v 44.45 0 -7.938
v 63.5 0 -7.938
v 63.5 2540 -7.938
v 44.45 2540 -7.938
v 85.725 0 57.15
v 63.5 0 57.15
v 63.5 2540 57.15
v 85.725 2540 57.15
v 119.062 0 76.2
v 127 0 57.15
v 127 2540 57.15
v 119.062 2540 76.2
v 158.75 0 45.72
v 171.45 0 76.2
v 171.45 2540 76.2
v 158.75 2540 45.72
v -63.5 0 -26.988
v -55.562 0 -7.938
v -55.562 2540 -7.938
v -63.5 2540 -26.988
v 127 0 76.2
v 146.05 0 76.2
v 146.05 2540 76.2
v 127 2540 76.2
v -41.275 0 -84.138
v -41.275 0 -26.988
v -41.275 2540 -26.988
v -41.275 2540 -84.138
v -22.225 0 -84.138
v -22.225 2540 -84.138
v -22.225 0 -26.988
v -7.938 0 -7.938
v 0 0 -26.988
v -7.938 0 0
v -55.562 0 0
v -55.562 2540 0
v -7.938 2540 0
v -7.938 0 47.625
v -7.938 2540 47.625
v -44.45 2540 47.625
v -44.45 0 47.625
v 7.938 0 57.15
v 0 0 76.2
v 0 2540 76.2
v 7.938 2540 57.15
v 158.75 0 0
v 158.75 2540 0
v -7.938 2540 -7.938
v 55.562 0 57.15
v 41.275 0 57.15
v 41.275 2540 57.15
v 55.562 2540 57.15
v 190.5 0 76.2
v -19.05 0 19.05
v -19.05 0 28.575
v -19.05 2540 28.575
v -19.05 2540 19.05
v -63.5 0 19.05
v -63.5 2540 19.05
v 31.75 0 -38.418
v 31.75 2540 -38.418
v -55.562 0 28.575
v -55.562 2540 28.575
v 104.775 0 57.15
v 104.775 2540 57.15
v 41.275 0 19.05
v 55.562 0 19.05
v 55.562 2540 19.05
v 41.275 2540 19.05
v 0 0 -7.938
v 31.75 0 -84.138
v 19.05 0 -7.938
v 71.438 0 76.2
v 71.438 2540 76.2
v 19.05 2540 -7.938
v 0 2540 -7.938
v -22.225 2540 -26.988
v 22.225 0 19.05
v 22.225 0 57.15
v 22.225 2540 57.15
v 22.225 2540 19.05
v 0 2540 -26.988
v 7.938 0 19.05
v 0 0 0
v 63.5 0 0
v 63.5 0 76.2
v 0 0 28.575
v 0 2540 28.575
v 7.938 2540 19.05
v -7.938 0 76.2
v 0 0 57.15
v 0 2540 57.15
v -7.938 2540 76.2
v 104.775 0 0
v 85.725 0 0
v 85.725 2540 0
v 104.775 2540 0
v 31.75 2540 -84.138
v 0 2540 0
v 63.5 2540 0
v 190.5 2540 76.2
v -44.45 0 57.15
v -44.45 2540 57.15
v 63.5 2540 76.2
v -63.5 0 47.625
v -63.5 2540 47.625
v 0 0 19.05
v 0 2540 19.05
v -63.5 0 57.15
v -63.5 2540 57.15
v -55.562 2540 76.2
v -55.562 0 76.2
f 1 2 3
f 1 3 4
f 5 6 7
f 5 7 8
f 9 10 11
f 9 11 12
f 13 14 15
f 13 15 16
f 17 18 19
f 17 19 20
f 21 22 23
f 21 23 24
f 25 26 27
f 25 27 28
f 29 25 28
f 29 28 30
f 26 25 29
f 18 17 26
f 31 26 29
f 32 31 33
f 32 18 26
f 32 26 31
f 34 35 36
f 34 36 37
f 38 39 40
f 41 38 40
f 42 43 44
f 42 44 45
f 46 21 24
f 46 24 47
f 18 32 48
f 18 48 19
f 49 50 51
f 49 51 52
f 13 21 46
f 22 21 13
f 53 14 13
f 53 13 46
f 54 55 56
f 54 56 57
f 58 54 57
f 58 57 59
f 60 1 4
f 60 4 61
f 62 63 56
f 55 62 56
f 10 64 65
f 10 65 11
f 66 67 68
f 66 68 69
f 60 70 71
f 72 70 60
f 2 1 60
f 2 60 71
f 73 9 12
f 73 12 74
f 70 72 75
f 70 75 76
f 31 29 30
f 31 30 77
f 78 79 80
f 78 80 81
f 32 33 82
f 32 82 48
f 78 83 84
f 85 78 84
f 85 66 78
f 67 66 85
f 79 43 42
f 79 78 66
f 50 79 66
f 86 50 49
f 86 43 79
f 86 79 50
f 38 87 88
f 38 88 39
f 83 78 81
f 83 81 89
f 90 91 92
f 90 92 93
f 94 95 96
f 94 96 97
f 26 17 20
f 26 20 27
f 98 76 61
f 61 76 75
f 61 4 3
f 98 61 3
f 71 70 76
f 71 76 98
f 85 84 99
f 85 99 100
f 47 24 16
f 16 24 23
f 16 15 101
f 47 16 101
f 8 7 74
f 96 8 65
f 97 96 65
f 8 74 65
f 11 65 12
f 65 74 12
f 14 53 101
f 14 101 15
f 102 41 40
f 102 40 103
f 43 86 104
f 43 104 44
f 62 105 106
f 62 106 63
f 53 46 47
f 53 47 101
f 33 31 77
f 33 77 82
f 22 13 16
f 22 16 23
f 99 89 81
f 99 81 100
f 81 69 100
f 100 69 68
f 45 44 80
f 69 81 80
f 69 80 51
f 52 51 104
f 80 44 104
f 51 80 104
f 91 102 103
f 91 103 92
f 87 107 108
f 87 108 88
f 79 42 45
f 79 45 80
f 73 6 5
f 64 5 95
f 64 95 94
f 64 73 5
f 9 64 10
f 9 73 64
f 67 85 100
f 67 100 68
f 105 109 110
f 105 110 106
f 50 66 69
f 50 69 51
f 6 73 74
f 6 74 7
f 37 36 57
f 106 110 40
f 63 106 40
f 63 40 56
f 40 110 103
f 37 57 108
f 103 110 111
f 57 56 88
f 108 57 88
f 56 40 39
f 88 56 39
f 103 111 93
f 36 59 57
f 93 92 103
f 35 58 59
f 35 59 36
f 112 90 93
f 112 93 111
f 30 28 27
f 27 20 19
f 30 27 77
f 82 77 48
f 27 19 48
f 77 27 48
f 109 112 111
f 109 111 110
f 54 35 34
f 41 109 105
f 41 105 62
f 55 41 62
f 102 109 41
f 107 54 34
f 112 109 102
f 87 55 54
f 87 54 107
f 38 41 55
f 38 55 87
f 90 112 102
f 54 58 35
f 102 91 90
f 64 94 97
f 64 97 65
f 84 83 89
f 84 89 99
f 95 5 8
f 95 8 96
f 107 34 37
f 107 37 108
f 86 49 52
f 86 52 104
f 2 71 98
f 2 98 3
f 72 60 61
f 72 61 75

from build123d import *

# Parameters (mm, degrees)
F1_DEPTH = 2540


with BuildPart() as f1:
    # F0 (on Front) → F1 (new body)
    with BuildSketch(Plane.XZ):
        Polygon((0, 57.15), (-7.9375, 76.2), (-55.5625, 76.2), (-63.5, 57.15), (-63.5, 47.625), (-55.5625, 28.575), (-19.05, 28.575), (-19.05, 19.05), (-63.5, 19.05), (-55.5625, 0), (-7.9375, 0), (0, 19.05), (0, 28.575), (-7.9375, 47.625), (-44.45, 47.625), (-44.45, 57.15), align=None)
        Polygon((7.9375, 19.05), (0, 0), (63.5, 0), (55.5625, 19.05), (41.275, 19.05), (41.275, 57.15), (55.5625, 57.15), (63.5, 76.2), (0, 76.2), (7.9375, 57.15), (22.225, 57.15), (22.225, 19.05), align=None)
        Polygon((0, -26.9875), (-7.9375, -7.9375), (-55.5625, -7.9375), (-63.5, -26.9875), (-41.275, -26.9875), (-41.275, -84.1375), (-22.225, -84.1375), (-22.225, -26.9875), align=None)
        Polygon((19.05, -7.9375), (0, -7.9375), (31.75, -84.1375), (63.5, -7.9375), (44.45, -7.9375), (31.75, -38.4175), align=None)
        Polygon((71.4375, 76.2), (63.5, 57.15), (85.725, 57.15), (85.725, 0), (104.775, 0), (104.775, 57.15), (127, 57.15), (119.0625, 76.2), align=None)
        Polygon((146.05, 76.2), (127, 76.2), (158.75, 0), (190.5, 76.2), (171.45, 76.2), (158.75, 45.72), align=None)
    extrude(amount=-F1_DEPTH)


solid = f1.part
